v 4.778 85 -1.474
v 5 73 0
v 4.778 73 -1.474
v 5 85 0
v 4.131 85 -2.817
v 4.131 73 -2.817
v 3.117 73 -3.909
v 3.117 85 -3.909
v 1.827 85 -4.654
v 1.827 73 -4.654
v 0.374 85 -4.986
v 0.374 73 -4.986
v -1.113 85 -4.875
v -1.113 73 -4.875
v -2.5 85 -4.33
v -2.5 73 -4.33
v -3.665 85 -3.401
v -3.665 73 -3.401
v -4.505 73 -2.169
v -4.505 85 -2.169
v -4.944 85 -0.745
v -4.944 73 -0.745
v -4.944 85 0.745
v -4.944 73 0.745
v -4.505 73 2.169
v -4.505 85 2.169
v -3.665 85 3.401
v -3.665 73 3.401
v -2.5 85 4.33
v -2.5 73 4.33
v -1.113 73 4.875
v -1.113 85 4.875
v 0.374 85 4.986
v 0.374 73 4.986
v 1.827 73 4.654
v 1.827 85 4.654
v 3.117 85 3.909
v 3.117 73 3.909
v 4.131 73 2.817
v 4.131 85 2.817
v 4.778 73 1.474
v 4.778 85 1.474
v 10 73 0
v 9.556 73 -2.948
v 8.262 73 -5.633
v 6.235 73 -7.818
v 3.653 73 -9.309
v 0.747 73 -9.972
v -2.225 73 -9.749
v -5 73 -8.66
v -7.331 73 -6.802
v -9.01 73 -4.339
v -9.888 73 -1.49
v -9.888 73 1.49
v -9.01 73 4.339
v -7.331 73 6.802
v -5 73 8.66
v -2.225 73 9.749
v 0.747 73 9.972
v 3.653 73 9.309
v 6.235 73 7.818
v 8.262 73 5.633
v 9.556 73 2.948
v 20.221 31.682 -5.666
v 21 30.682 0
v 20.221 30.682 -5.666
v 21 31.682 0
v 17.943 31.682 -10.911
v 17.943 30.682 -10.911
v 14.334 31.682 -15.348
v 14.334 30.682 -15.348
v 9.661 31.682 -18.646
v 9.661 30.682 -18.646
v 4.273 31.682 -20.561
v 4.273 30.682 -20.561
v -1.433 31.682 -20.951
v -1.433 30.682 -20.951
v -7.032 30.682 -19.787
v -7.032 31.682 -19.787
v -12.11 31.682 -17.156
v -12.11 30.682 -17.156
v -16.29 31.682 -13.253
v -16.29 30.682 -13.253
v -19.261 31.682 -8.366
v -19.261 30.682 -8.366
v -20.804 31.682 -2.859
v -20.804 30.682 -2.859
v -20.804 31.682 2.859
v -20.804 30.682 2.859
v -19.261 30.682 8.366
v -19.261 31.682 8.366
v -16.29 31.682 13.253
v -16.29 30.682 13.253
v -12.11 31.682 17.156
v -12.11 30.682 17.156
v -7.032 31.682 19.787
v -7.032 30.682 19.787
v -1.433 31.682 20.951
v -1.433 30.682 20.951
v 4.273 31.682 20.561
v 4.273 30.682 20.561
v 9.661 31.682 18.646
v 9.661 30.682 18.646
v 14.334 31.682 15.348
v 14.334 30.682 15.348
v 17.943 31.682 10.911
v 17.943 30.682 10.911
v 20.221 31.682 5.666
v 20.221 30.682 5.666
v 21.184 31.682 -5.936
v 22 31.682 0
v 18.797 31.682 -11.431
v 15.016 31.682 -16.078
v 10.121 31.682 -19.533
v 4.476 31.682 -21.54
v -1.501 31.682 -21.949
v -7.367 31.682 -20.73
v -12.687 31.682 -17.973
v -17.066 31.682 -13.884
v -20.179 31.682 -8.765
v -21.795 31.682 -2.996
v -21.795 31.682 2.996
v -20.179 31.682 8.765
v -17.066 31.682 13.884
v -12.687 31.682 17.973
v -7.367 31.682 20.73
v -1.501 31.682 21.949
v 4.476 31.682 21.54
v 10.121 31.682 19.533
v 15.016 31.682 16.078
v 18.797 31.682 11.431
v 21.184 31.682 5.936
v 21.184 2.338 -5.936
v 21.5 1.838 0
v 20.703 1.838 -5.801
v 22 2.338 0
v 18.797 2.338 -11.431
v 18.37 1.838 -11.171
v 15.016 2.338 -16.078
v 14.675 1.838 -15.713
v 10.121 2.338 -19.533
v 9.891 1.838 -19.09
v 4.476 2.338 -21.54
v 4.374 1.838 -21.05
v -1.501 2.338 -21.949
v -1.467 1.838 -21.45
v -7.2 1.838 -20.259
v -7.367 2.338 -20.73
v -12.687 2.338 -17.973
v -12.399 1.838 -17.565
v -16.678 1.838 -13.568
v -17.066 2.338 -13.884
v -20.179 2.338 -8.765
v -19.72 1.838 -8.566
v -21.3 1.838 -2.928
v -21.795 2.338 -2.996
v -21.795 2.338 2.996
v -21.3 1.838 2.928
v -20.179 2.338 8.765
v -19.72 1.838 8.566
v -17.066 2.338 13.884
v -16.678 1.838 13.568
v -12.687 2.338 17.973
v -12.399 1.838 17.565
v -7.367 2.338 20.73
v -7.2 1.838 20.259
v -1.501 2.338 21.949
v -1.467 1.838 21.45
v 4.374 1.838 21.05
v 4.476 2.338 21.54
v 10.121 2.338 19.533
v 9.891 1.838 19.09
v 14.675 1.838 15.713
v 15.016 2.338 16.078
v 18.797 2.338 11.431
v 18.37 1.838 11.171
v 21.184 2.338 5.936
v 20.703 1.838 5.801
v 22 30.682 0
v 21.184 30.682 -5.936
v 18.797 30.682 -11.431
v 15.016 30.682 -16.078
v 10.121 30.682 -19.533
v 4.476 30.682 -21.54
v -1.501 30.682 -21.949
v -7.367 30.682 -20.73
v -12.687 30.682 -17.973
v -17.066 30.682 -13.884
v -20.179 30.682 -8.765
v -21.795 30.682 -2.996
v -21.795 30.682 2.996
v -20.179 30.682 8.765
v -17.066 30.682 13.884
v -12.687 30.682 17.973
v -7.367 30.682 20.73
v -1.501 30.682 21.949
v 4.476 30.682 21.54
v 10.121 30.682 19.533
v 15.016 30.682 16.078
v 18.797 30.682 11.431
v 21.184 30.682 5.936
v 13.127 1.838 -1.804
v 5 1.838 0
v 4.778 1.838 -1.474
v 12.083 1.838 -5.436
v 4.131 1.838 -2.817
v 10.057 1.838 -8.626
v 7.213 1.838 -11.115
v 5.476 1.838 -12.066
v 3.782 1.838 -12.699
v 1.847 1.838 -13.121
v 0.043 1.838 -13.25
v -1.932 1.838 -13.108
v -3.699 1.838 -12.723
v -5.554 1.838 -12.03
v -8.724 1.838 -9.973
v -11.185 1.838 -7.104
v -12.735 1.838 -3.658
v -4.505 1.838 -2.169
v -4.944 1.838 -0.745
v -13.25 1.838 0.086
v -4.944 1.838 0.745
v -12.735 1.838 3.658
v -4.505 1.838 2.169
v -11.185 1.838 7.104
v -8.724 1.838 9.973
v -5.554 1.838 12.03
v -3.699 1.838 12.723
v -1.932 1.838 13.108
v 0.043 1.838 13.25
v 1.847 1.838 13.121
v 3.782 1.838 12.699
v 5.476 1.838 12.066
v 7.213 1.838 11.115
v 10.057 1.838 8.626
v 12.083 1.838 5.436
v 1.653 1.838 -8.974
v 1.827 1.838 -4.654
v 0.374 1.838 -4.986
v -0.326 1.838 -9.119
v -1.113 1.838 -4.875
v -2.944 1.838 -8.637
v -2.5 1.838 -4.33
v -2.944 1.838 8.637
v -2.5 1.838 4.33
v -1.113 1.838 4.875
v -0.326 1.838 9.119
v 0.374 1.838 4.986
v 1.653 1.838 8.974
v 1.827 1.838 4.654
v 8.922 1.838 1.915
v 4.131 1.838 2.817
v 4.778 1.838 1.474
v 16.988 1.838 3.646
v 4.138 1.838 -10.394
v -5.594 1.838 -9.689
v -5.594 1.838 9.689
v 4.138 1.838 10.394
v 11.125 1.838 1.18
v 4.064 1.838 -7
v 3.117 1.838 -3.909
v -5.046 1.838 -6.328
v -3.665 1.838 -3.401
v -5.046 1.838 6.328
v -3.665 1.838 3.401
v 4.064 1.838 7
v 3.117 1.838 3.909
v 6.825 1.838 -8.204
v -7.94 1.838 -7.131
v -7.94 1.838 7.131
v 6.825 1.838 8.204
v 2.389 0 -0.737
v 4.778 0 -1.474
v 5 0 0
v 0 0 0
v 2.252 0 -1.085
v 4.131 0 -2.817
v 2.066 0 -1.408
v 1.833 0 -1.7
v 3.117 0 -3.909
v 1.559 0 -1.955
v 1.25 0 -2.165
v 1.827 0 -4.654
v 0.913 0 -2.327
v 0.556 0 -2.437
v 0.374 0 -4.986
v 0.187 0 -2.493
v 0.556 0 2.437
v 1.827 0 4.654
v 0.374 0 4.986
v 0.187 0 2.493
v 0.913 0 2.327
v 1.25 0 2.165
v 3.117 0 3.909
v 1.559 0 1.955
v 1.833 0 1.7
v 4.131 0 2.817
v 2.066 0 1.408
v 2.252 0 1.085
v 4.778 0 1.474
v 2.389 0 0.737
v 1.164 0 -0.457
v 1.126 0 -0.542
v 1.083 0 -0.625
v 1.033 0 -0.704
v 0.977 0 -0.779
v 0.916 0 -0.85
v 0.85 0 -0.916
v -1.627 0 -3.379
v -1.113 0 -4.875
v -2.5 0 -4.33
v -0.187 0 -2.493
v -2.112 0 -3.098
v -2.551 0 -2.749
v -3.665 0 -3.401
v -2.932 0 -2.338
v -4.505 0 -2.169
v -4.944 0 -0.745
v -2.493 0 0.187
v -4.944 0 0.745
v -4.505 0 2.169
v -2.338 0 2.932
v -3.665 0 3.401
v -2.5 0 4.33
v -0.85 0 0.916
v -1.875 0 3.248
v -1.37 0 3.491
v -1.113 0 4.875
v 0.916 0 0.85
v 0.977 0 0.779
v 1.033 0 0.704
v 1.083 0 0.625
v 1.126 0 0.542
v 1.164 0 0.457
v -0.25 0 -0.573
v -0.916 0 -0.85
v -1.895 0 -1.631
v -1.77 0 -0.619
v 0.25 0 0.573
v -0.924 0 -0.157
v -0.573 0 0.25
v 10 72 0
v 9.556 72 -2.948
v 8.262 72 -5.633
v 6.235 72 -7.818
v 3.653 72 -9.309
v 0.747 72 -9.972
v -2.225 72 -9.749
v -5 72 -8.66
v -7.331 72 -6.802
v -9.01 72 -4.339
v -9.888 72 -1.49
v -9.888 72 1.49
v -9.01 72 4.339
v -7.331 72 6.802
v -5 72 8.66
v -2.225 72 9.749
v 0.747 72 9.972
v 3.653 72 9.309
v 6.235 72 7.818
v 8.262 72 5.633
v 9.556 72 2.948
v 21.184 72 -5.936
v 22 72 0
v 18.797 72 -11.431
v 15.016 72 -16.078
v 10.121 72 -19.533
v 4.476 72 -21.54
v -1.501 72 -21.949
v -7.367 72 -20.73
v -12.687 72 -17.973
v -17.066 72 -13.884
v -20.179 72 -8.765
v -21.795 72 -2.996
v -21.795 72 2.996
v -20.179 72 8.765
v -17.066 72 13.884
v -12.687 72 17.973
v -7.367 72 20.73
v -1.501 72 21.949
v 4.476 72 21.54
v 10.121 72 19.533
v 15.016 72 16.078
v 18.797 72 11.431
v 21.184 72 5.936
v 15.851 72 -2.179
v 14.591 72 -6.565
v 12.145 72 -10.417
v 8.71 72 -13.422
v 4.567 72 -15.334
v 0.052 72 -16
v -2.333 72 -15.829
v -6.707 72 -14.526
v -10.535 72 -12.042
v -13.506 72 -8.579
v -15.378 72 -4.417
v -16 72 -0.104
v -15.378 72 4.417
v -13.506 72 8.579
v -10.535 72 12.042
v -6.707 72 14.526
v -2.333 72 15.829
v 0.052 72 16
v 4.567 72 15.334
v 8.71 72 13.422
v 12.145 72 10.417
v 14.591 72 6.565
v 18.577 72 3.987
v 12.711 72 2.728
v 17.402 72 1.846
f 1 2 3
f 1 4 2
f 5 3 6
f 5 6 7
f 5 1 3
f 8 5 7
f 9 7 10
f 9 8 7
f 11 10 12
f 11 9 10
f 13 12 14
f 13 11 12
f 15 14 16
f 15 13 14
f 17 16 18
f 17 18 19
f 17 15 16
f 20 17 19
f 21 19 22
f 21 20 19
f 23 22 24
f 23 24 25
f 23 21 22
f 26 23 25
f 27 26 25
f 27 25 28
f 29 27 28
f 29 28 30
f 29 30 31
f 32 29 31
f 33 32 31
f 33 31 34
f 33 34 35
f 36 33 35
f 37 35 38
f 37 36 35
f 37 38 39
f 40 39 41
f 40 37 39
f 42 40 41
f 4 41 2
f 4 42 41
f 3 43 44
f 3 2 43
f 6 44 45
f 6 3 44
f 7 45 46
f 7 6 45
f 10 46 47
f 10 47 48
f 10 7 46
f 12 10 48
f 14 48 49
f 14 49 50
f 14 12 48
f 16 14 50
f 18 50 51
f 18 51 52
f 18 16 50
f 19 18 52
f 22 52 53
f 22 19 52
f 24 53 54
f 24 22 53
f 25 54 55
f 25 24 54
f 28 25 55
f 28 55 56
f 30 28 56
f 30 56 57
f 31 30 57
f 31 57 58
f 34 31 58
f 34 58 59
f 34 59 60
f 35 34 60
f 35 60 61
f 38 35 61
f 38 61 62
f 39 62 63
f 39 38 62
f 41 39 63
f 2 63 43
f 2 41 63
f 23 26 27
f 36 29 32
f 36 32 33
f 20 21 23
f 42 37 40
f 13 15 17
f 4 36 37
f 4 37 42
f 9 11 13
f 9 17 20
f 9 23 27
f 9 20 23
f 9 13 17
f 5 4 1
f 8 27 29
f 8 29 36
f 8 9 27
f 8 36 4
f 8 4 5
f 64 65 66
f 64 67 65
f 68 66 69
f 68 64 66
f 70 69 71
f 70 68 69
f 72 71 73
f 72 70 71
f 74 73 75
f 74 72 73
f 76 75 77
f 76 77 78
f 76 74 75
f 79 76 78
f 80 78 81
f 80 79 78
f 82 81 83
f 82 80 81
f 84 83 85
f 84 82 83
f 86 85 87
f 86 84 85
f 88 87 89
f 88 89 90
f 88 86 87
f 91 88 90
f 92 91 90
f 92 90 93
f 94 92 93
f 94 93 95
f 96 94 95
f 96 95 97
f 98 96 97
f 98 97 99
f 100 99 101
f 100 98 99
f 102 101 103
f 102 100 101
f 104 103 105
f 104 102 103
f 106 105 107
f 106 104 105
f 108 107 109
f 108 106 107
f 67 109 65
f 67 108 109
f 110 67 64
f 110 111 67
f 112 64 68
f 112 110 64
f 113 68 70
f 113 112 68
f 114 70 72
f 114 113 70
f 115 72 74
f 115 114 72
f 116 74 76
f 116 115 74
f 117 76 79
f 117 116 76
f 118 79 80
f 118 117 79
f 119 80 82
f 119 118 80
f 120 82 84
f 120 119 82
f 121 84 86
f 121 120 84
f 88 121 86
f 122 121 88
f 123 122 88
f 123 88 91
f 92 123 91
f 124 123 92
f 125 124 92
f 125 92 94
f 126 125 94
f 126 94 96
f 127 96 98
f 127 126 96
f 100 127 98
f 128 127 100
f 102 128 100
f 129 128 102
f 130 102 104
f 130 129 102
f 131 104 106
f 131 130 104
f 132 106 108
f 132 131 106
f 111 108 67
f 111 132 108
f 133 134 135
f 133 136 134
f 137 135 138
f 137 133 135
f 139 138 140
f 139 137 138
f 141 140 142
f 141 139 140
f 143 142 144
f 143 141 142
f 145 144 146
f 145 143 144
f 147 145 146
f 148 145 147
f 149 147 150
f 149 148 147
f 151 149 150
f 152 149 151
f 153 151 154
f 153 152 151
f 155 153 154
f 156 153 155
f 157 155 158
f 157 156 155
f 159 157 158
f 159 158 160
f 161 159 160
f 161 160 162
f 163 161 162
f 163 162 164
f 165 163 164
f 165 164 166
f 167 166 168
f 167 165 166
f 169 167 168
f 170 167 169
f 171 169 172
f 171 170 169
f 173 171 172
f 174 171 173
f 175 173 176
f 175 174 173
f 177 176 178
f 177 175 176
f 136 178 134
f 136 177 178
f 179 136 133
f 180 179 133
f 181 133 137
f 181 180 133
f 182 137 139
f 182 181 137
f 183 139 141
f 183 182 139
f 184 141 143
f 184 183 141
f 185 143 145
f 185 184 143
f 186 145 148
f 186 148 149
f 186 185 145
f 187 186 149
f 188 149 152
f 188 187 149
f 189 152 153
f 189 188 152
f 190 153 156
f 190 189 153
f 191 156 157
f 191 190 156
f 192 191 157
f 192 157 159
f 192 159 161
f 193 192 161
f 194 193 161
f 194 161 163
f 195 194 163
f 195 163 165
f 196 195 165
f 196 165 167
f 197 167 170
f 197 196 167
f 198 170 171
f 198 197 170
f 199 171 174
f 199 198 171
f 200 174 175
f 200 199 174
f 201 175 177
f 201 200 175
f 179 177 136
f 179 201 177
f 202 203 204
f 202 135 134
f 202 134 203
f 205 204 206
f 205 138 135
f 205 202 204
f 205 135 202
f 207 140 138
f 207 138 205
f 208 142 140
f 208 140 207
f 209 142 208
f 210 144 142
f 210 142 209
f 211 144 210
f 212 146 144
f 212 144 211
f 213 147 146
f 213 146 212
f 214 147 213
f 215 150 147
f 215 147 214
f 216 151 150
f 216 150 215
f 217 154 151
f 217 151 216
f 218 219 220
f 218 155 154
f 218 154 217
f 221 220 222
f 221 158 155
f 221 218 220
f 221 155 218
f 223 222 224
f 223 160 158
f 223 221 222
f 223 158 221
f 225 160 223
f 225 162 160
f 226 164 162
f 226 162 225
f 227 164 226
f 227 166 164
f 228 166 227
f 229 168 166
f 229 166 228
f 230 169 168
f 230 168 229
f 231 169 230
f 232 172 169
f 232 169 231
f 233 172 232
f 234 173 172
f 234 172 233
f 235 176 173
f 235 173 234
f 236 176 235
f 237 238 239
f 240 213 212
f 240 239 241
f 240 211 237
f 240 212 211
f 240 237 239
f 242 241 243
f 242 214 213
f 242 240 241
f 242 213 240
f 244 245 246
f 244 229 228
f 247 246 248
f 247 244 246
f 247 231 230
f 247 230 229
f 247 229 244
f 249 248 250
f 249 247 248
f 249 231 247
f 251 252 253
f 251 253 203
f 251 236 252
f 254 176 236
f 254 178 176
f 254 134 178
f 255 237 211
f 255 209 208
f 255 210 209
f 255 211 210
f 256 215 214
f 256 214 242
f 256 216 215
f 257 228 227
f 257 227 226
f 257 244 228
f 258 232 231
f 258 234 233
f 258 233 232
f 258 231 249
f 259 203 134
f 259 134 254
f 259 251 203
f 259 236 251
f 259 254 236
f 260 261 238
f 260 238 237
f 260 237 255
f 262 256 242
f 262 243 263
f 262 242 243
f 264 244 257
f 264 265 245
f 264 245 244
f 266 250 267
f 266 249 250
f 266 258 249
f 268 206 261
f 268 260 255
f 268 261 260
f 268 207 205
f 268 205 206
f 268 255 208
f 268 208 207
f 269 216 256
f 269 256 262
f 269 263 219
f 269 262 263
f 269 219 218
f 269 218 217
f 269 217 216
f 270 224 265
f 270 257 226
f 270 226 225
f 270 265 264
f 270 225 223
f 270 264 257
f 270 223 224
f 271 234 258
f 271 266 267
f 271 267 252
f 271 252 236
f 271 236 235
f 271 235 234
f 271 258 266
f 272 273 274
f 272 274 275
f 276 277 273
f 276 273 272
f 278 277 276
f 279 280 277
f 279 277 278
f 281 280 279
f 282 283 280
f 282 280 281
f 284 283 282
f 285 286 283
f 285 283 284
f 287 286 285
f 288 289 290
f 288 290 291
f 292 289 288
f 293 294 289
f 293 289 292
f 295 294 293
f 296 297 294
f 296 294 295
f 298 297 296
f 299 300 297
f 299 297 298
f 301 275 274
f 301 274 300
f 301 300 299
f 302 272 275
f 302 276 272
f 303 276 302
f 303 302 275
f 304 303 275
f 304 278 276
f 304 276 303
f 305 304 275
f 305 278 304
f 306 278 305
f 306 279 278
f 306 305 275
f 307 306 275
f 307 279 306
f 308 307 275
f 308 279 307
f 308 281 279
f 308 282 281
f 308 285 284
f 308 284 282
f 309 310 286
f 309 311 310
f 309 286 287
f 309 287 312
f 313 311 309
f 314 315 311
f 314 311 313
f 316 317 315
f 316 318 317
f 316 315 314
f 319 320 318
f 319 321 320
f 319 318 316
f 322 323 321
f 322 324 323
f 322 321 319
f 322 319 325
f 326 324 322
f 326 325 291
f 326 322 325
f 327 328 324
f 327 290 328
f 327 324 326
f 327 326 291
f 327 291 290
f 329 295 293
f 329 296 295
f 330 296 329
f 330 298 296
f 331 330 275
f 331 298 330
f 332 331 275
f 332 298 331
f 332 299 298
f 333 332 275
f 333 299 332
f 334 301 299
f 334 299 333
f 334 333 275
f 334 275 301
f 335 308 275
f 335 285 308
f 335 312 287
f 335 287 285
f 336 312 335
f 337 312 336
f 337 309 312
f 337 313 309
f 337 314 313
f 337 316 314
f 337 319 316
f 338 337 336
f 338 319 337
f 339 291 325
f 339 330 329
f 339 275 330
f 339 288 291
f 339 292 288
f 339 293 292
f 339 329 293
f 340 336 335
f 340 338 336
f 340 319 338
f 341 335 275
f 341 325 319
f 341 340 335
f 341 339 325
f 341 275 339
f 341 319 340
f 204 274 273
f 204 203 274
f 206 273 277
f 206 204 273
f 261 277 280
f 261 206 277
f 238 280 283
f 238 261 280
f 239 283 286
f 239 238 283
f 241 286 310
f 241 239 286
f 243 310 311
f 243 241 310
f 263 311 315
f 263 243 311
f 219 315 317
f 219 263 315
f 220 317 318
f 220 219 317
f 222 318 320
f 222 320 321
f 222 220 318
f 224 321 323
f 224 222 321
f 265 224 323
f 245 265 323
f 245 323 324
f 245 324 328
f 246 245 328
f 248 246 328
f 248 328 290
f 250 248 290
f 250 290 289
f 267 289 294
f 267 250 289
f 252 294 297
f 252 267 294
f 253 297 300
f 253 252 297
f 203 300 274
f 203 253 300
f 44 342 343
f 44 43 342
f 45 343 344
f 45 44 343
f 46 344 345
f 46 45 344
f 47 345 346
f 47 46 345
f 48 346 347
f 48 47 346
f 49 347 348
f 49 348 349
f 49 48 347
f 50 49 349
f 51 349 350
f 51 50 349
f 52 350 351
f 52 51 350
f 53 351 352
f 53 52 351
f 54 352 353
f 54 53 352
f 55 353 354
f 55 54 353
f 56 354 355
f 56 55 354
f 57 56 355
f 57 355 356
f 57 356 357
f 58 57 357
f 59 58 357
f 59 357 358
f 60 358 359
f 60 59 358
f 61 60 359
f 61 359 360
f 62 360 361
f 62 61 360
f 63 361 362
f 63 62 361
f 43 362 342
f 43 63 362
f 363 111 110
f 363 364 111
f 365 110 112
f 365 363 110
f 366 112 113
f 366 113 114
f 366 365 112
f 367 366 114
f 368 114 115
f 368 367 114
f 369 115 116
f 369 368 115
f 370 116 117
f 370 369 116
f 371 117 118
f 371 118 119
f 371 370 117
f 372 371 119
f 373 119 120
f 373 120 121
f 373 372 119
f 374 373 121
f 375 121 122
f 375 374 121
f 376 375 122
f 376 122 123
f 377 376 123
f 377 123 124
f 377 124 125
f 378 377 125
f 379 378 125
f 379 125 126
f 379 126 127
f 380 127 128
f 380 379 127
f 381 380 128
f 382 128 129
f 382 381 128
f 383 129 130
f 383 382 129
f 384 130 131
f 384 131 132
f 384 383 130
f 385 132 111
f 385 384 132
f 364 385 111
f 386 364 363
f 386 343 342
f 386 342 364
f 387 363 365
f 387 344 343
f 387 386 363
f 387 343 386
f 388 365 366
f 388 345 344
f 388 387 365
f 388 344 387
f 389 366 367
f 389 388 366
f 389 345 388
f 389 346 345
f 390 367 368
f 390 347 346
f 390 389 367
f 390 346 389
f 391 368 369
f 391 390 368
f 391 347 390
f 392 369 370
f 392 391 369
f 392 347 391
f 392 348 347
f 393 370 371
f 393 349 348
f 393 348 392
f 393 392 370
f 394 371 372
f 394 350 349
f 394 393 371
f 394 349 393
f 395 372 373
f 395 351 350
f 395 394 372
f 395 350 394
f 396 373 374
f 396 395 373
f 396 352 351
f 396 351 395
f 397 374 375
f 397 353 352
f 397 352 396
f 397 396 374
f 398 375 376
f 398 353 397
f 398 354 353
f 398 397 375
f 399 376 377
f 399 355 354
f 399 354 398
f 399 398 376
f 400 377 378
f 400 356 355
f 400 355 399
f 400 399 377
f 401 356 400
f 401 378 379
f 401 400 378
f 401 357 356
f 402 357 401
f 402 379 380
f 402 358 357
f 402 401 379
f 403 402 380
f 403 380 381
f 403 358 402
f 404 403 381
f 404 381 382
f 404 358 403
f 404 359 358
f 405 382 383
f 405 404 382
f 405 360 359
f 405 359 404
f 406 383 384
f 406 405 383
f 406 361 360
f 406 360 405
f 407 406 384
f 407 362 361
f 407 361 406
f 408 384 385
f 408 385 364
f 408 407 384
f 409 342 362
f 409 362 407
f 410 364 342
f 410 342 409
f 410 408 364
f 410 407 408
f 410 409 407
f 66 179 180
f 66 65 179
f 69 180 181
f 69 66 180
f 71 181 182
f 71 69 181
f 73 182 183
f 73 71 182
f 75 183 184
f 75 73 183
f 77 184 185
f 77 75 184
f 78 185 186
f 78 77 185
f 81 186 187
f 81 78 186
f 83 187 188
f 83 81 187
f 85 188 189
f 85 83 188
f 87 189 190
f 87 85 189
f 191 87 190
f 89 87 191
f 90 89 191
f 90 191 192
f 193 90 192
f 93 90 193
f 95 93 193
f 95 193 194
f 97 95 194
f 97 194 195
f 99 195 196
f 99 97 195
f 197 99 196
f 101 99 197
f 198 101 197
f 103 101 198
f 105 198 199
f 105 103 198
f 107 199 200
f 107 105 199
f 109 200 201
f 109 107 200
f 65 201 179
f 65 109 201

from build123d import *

# Parameters (mm, degrees)
CUT_EXTRUDE_1_DEPTH      = 23
CUT_EXTRUDE_1_DEPTH_BACK = 3
SKETCH_8_R               = 1.5
THREAD_2_PITCH           = 0.3175
SKETCH_9_R               = 5
CUT_EXTRUDE_2_DEPTH      = 15


with BuildPart() as part:
    # 扫描1: sweep along a path in 草图7
    with BuildLine(Plane(origin=(0, 20, 0), x_dir=(1, 0, 0), z_dir=(0, 1, 0))) as sweep_1_path:
        CenterArc((0, 0), 8.222167991, 0, 360)
    # 草图6 → 扫描1 (sweep)
    with BuildSketch(Plane.XY):
        Polygon((0, 0), (0, 98), (5, 98), (5, 73), (10, 73), (10, 72), (22, 72), (22, 31.681513685), (21, 31.681513685), (21, 30.681513685), (22, 30.681513685), (22, 2.337983279), (21.5, 1.837983279), (5, 1.837983279), (5, 0), align=None)
    sweep(path=sweep_1_path.line)

    # 草图8 → 切除-拉伸1 (cut, two sides: drawn at the far end of the back side and taken through both)
    with BuildSketch(Plane.XY.offset(-CUT_EXTRUDE_1_DEPTH_BACK)):
        with Locations(Location((0, 90.222635434, 0), (0, 0, 270))):
            Circle(SKETCH_8_R)
    extrude(amount=CUT_EXTRUDE_1_DEPTH + CUT_EXTRUDE_1_DEPTH_BACK, mode=Mode.SUBTRACT)

    # 螺纹线2: the profile of 螺纹线轮廓3 profile screwed along a right-hand helix of 23.622047 turns, 6 arcs to a turn; built about Z, then put on its axis
    thread_2_z = Axis((0, 0, 0), (0, 0, 1))
    thread_2_corners = [(1.5003, 0, -0.000173205), (1.5003, 0, 0.277985704), (1.328148085, 0, 0.17859375), (1.328148085, 0, 0.09921875)]
    with BuildLine(mode=Mode.PRIVATE) as thread_2_profile:
        Line(thread_2_corners[0], thread_2_corners[1])
        Line(thread_2_corners[1], thread_2_corners[2])
        Line(thread_2_corners[2], thread_2_corners[3])
        Line(thread_2_corners[3], thread_2_corners[0])
    thread_2_cap = Face(thread_2_profile.wire())
    thread_2_turn_angles = [0, 30, 60, 90, 120, 150, 180, 210, 240, 270, 300, 330, 360]
    thread_2_turn_weights = [1, 0.8660254037844387, 1, 0.8660254037844387, 1, 0.8660254037844387, 1, 0.8660254037844387, 1, 0.8660254037844387, 1, 0.8660254037844387, 1]
    thread_2_turn_rails = [Edge.make_bspline([Vector(p[0], p[1], 0).rotate(thread_2_z, thread_2_turn_angles[k]) / thread_2_turn_weights[k] + Vector(0, 0, p[2] + THREAD_2_PITCH * thread_2_turn_angles[k] / 360) for k in range(13)], [0, 0, 0, 1, 1, 2, 2, 3, 3, 4, 4, 5, 5, 6, 6, 6], 2, thread_2_turn_weights) for p in thread_2_corners]
    thread_2_turn_sides = [Face.make_surface_from_curves(thread_2_turn_rails[p[0]], thread_2_turn_rails[p[1]]) for p in [(0, 1), (1, 2), (2, 3), (3, 0)]]
    thread_2_last_angles = [8280, 8310, 8340, 8370, 8400, 8430, 8460, 8481.968503937, 8503.937007874]
    thread_2_last_weights = [1, 0.8660254037844387, 1, 0.8660254037844387, 1, 0.8660254037844387, 1, 0.9273896394584102, 1]
    thread_2_last_rails = [Edge.make_bspline([Vector(p[0], p[1], 0).rotate(thread_2_z, thread_2_last_angles[k]) / thread_2_last_weights[k] + Vector(0, 0, p[2] + THREAD_2_PITCH * thread_2_last_angles[k] / 360) for k in range(9)], [0, 0, 0, 1, 1, 2, 2, 3, 3, 4, 4, 4], 2, thread_2_last_weights) for p in thread_2_corners]
    thread_2_last_sides = [Face.make_surface_from_curves(thread_2_last_rails[p[0]], thread_2_last_rails[p[1]]) for p in [(0, 1), (1, 2), (2, 3), (3, 0)]]
    thread_2 = Plane(origin=(0, 90.222635434, -3), x_dir=(1, 0, 0), z_dir=(0, 0, 1)) * Solid(Shell([*[p.moved(Location((0, 0, THREAD_2_PITCH * i))) for i in range(23) for p in thread_2_turn_sides], *thread_2_last_sides, thread_2_cap, thread_2_cap.rotate(thread_2_z, 8503.937007874).moved(Location((0, 0, THREAD_2_PITCH * 8503.937007874 / 360)))]))
    add(thread_2)

    # 草图9 → 切除-拉伸2 (cut)
    with BuildSketch(Plane(origin=(0, 100, 0), x_dir=(1, 0, 0), z_dir=(0, 1, 0))):
        Circle(SKETCH_9_R)
    extrude(amount=-CUT_EXTRUDE_2_DEPTH, mode=Mode.SUBTRACT)


solid = part.part
